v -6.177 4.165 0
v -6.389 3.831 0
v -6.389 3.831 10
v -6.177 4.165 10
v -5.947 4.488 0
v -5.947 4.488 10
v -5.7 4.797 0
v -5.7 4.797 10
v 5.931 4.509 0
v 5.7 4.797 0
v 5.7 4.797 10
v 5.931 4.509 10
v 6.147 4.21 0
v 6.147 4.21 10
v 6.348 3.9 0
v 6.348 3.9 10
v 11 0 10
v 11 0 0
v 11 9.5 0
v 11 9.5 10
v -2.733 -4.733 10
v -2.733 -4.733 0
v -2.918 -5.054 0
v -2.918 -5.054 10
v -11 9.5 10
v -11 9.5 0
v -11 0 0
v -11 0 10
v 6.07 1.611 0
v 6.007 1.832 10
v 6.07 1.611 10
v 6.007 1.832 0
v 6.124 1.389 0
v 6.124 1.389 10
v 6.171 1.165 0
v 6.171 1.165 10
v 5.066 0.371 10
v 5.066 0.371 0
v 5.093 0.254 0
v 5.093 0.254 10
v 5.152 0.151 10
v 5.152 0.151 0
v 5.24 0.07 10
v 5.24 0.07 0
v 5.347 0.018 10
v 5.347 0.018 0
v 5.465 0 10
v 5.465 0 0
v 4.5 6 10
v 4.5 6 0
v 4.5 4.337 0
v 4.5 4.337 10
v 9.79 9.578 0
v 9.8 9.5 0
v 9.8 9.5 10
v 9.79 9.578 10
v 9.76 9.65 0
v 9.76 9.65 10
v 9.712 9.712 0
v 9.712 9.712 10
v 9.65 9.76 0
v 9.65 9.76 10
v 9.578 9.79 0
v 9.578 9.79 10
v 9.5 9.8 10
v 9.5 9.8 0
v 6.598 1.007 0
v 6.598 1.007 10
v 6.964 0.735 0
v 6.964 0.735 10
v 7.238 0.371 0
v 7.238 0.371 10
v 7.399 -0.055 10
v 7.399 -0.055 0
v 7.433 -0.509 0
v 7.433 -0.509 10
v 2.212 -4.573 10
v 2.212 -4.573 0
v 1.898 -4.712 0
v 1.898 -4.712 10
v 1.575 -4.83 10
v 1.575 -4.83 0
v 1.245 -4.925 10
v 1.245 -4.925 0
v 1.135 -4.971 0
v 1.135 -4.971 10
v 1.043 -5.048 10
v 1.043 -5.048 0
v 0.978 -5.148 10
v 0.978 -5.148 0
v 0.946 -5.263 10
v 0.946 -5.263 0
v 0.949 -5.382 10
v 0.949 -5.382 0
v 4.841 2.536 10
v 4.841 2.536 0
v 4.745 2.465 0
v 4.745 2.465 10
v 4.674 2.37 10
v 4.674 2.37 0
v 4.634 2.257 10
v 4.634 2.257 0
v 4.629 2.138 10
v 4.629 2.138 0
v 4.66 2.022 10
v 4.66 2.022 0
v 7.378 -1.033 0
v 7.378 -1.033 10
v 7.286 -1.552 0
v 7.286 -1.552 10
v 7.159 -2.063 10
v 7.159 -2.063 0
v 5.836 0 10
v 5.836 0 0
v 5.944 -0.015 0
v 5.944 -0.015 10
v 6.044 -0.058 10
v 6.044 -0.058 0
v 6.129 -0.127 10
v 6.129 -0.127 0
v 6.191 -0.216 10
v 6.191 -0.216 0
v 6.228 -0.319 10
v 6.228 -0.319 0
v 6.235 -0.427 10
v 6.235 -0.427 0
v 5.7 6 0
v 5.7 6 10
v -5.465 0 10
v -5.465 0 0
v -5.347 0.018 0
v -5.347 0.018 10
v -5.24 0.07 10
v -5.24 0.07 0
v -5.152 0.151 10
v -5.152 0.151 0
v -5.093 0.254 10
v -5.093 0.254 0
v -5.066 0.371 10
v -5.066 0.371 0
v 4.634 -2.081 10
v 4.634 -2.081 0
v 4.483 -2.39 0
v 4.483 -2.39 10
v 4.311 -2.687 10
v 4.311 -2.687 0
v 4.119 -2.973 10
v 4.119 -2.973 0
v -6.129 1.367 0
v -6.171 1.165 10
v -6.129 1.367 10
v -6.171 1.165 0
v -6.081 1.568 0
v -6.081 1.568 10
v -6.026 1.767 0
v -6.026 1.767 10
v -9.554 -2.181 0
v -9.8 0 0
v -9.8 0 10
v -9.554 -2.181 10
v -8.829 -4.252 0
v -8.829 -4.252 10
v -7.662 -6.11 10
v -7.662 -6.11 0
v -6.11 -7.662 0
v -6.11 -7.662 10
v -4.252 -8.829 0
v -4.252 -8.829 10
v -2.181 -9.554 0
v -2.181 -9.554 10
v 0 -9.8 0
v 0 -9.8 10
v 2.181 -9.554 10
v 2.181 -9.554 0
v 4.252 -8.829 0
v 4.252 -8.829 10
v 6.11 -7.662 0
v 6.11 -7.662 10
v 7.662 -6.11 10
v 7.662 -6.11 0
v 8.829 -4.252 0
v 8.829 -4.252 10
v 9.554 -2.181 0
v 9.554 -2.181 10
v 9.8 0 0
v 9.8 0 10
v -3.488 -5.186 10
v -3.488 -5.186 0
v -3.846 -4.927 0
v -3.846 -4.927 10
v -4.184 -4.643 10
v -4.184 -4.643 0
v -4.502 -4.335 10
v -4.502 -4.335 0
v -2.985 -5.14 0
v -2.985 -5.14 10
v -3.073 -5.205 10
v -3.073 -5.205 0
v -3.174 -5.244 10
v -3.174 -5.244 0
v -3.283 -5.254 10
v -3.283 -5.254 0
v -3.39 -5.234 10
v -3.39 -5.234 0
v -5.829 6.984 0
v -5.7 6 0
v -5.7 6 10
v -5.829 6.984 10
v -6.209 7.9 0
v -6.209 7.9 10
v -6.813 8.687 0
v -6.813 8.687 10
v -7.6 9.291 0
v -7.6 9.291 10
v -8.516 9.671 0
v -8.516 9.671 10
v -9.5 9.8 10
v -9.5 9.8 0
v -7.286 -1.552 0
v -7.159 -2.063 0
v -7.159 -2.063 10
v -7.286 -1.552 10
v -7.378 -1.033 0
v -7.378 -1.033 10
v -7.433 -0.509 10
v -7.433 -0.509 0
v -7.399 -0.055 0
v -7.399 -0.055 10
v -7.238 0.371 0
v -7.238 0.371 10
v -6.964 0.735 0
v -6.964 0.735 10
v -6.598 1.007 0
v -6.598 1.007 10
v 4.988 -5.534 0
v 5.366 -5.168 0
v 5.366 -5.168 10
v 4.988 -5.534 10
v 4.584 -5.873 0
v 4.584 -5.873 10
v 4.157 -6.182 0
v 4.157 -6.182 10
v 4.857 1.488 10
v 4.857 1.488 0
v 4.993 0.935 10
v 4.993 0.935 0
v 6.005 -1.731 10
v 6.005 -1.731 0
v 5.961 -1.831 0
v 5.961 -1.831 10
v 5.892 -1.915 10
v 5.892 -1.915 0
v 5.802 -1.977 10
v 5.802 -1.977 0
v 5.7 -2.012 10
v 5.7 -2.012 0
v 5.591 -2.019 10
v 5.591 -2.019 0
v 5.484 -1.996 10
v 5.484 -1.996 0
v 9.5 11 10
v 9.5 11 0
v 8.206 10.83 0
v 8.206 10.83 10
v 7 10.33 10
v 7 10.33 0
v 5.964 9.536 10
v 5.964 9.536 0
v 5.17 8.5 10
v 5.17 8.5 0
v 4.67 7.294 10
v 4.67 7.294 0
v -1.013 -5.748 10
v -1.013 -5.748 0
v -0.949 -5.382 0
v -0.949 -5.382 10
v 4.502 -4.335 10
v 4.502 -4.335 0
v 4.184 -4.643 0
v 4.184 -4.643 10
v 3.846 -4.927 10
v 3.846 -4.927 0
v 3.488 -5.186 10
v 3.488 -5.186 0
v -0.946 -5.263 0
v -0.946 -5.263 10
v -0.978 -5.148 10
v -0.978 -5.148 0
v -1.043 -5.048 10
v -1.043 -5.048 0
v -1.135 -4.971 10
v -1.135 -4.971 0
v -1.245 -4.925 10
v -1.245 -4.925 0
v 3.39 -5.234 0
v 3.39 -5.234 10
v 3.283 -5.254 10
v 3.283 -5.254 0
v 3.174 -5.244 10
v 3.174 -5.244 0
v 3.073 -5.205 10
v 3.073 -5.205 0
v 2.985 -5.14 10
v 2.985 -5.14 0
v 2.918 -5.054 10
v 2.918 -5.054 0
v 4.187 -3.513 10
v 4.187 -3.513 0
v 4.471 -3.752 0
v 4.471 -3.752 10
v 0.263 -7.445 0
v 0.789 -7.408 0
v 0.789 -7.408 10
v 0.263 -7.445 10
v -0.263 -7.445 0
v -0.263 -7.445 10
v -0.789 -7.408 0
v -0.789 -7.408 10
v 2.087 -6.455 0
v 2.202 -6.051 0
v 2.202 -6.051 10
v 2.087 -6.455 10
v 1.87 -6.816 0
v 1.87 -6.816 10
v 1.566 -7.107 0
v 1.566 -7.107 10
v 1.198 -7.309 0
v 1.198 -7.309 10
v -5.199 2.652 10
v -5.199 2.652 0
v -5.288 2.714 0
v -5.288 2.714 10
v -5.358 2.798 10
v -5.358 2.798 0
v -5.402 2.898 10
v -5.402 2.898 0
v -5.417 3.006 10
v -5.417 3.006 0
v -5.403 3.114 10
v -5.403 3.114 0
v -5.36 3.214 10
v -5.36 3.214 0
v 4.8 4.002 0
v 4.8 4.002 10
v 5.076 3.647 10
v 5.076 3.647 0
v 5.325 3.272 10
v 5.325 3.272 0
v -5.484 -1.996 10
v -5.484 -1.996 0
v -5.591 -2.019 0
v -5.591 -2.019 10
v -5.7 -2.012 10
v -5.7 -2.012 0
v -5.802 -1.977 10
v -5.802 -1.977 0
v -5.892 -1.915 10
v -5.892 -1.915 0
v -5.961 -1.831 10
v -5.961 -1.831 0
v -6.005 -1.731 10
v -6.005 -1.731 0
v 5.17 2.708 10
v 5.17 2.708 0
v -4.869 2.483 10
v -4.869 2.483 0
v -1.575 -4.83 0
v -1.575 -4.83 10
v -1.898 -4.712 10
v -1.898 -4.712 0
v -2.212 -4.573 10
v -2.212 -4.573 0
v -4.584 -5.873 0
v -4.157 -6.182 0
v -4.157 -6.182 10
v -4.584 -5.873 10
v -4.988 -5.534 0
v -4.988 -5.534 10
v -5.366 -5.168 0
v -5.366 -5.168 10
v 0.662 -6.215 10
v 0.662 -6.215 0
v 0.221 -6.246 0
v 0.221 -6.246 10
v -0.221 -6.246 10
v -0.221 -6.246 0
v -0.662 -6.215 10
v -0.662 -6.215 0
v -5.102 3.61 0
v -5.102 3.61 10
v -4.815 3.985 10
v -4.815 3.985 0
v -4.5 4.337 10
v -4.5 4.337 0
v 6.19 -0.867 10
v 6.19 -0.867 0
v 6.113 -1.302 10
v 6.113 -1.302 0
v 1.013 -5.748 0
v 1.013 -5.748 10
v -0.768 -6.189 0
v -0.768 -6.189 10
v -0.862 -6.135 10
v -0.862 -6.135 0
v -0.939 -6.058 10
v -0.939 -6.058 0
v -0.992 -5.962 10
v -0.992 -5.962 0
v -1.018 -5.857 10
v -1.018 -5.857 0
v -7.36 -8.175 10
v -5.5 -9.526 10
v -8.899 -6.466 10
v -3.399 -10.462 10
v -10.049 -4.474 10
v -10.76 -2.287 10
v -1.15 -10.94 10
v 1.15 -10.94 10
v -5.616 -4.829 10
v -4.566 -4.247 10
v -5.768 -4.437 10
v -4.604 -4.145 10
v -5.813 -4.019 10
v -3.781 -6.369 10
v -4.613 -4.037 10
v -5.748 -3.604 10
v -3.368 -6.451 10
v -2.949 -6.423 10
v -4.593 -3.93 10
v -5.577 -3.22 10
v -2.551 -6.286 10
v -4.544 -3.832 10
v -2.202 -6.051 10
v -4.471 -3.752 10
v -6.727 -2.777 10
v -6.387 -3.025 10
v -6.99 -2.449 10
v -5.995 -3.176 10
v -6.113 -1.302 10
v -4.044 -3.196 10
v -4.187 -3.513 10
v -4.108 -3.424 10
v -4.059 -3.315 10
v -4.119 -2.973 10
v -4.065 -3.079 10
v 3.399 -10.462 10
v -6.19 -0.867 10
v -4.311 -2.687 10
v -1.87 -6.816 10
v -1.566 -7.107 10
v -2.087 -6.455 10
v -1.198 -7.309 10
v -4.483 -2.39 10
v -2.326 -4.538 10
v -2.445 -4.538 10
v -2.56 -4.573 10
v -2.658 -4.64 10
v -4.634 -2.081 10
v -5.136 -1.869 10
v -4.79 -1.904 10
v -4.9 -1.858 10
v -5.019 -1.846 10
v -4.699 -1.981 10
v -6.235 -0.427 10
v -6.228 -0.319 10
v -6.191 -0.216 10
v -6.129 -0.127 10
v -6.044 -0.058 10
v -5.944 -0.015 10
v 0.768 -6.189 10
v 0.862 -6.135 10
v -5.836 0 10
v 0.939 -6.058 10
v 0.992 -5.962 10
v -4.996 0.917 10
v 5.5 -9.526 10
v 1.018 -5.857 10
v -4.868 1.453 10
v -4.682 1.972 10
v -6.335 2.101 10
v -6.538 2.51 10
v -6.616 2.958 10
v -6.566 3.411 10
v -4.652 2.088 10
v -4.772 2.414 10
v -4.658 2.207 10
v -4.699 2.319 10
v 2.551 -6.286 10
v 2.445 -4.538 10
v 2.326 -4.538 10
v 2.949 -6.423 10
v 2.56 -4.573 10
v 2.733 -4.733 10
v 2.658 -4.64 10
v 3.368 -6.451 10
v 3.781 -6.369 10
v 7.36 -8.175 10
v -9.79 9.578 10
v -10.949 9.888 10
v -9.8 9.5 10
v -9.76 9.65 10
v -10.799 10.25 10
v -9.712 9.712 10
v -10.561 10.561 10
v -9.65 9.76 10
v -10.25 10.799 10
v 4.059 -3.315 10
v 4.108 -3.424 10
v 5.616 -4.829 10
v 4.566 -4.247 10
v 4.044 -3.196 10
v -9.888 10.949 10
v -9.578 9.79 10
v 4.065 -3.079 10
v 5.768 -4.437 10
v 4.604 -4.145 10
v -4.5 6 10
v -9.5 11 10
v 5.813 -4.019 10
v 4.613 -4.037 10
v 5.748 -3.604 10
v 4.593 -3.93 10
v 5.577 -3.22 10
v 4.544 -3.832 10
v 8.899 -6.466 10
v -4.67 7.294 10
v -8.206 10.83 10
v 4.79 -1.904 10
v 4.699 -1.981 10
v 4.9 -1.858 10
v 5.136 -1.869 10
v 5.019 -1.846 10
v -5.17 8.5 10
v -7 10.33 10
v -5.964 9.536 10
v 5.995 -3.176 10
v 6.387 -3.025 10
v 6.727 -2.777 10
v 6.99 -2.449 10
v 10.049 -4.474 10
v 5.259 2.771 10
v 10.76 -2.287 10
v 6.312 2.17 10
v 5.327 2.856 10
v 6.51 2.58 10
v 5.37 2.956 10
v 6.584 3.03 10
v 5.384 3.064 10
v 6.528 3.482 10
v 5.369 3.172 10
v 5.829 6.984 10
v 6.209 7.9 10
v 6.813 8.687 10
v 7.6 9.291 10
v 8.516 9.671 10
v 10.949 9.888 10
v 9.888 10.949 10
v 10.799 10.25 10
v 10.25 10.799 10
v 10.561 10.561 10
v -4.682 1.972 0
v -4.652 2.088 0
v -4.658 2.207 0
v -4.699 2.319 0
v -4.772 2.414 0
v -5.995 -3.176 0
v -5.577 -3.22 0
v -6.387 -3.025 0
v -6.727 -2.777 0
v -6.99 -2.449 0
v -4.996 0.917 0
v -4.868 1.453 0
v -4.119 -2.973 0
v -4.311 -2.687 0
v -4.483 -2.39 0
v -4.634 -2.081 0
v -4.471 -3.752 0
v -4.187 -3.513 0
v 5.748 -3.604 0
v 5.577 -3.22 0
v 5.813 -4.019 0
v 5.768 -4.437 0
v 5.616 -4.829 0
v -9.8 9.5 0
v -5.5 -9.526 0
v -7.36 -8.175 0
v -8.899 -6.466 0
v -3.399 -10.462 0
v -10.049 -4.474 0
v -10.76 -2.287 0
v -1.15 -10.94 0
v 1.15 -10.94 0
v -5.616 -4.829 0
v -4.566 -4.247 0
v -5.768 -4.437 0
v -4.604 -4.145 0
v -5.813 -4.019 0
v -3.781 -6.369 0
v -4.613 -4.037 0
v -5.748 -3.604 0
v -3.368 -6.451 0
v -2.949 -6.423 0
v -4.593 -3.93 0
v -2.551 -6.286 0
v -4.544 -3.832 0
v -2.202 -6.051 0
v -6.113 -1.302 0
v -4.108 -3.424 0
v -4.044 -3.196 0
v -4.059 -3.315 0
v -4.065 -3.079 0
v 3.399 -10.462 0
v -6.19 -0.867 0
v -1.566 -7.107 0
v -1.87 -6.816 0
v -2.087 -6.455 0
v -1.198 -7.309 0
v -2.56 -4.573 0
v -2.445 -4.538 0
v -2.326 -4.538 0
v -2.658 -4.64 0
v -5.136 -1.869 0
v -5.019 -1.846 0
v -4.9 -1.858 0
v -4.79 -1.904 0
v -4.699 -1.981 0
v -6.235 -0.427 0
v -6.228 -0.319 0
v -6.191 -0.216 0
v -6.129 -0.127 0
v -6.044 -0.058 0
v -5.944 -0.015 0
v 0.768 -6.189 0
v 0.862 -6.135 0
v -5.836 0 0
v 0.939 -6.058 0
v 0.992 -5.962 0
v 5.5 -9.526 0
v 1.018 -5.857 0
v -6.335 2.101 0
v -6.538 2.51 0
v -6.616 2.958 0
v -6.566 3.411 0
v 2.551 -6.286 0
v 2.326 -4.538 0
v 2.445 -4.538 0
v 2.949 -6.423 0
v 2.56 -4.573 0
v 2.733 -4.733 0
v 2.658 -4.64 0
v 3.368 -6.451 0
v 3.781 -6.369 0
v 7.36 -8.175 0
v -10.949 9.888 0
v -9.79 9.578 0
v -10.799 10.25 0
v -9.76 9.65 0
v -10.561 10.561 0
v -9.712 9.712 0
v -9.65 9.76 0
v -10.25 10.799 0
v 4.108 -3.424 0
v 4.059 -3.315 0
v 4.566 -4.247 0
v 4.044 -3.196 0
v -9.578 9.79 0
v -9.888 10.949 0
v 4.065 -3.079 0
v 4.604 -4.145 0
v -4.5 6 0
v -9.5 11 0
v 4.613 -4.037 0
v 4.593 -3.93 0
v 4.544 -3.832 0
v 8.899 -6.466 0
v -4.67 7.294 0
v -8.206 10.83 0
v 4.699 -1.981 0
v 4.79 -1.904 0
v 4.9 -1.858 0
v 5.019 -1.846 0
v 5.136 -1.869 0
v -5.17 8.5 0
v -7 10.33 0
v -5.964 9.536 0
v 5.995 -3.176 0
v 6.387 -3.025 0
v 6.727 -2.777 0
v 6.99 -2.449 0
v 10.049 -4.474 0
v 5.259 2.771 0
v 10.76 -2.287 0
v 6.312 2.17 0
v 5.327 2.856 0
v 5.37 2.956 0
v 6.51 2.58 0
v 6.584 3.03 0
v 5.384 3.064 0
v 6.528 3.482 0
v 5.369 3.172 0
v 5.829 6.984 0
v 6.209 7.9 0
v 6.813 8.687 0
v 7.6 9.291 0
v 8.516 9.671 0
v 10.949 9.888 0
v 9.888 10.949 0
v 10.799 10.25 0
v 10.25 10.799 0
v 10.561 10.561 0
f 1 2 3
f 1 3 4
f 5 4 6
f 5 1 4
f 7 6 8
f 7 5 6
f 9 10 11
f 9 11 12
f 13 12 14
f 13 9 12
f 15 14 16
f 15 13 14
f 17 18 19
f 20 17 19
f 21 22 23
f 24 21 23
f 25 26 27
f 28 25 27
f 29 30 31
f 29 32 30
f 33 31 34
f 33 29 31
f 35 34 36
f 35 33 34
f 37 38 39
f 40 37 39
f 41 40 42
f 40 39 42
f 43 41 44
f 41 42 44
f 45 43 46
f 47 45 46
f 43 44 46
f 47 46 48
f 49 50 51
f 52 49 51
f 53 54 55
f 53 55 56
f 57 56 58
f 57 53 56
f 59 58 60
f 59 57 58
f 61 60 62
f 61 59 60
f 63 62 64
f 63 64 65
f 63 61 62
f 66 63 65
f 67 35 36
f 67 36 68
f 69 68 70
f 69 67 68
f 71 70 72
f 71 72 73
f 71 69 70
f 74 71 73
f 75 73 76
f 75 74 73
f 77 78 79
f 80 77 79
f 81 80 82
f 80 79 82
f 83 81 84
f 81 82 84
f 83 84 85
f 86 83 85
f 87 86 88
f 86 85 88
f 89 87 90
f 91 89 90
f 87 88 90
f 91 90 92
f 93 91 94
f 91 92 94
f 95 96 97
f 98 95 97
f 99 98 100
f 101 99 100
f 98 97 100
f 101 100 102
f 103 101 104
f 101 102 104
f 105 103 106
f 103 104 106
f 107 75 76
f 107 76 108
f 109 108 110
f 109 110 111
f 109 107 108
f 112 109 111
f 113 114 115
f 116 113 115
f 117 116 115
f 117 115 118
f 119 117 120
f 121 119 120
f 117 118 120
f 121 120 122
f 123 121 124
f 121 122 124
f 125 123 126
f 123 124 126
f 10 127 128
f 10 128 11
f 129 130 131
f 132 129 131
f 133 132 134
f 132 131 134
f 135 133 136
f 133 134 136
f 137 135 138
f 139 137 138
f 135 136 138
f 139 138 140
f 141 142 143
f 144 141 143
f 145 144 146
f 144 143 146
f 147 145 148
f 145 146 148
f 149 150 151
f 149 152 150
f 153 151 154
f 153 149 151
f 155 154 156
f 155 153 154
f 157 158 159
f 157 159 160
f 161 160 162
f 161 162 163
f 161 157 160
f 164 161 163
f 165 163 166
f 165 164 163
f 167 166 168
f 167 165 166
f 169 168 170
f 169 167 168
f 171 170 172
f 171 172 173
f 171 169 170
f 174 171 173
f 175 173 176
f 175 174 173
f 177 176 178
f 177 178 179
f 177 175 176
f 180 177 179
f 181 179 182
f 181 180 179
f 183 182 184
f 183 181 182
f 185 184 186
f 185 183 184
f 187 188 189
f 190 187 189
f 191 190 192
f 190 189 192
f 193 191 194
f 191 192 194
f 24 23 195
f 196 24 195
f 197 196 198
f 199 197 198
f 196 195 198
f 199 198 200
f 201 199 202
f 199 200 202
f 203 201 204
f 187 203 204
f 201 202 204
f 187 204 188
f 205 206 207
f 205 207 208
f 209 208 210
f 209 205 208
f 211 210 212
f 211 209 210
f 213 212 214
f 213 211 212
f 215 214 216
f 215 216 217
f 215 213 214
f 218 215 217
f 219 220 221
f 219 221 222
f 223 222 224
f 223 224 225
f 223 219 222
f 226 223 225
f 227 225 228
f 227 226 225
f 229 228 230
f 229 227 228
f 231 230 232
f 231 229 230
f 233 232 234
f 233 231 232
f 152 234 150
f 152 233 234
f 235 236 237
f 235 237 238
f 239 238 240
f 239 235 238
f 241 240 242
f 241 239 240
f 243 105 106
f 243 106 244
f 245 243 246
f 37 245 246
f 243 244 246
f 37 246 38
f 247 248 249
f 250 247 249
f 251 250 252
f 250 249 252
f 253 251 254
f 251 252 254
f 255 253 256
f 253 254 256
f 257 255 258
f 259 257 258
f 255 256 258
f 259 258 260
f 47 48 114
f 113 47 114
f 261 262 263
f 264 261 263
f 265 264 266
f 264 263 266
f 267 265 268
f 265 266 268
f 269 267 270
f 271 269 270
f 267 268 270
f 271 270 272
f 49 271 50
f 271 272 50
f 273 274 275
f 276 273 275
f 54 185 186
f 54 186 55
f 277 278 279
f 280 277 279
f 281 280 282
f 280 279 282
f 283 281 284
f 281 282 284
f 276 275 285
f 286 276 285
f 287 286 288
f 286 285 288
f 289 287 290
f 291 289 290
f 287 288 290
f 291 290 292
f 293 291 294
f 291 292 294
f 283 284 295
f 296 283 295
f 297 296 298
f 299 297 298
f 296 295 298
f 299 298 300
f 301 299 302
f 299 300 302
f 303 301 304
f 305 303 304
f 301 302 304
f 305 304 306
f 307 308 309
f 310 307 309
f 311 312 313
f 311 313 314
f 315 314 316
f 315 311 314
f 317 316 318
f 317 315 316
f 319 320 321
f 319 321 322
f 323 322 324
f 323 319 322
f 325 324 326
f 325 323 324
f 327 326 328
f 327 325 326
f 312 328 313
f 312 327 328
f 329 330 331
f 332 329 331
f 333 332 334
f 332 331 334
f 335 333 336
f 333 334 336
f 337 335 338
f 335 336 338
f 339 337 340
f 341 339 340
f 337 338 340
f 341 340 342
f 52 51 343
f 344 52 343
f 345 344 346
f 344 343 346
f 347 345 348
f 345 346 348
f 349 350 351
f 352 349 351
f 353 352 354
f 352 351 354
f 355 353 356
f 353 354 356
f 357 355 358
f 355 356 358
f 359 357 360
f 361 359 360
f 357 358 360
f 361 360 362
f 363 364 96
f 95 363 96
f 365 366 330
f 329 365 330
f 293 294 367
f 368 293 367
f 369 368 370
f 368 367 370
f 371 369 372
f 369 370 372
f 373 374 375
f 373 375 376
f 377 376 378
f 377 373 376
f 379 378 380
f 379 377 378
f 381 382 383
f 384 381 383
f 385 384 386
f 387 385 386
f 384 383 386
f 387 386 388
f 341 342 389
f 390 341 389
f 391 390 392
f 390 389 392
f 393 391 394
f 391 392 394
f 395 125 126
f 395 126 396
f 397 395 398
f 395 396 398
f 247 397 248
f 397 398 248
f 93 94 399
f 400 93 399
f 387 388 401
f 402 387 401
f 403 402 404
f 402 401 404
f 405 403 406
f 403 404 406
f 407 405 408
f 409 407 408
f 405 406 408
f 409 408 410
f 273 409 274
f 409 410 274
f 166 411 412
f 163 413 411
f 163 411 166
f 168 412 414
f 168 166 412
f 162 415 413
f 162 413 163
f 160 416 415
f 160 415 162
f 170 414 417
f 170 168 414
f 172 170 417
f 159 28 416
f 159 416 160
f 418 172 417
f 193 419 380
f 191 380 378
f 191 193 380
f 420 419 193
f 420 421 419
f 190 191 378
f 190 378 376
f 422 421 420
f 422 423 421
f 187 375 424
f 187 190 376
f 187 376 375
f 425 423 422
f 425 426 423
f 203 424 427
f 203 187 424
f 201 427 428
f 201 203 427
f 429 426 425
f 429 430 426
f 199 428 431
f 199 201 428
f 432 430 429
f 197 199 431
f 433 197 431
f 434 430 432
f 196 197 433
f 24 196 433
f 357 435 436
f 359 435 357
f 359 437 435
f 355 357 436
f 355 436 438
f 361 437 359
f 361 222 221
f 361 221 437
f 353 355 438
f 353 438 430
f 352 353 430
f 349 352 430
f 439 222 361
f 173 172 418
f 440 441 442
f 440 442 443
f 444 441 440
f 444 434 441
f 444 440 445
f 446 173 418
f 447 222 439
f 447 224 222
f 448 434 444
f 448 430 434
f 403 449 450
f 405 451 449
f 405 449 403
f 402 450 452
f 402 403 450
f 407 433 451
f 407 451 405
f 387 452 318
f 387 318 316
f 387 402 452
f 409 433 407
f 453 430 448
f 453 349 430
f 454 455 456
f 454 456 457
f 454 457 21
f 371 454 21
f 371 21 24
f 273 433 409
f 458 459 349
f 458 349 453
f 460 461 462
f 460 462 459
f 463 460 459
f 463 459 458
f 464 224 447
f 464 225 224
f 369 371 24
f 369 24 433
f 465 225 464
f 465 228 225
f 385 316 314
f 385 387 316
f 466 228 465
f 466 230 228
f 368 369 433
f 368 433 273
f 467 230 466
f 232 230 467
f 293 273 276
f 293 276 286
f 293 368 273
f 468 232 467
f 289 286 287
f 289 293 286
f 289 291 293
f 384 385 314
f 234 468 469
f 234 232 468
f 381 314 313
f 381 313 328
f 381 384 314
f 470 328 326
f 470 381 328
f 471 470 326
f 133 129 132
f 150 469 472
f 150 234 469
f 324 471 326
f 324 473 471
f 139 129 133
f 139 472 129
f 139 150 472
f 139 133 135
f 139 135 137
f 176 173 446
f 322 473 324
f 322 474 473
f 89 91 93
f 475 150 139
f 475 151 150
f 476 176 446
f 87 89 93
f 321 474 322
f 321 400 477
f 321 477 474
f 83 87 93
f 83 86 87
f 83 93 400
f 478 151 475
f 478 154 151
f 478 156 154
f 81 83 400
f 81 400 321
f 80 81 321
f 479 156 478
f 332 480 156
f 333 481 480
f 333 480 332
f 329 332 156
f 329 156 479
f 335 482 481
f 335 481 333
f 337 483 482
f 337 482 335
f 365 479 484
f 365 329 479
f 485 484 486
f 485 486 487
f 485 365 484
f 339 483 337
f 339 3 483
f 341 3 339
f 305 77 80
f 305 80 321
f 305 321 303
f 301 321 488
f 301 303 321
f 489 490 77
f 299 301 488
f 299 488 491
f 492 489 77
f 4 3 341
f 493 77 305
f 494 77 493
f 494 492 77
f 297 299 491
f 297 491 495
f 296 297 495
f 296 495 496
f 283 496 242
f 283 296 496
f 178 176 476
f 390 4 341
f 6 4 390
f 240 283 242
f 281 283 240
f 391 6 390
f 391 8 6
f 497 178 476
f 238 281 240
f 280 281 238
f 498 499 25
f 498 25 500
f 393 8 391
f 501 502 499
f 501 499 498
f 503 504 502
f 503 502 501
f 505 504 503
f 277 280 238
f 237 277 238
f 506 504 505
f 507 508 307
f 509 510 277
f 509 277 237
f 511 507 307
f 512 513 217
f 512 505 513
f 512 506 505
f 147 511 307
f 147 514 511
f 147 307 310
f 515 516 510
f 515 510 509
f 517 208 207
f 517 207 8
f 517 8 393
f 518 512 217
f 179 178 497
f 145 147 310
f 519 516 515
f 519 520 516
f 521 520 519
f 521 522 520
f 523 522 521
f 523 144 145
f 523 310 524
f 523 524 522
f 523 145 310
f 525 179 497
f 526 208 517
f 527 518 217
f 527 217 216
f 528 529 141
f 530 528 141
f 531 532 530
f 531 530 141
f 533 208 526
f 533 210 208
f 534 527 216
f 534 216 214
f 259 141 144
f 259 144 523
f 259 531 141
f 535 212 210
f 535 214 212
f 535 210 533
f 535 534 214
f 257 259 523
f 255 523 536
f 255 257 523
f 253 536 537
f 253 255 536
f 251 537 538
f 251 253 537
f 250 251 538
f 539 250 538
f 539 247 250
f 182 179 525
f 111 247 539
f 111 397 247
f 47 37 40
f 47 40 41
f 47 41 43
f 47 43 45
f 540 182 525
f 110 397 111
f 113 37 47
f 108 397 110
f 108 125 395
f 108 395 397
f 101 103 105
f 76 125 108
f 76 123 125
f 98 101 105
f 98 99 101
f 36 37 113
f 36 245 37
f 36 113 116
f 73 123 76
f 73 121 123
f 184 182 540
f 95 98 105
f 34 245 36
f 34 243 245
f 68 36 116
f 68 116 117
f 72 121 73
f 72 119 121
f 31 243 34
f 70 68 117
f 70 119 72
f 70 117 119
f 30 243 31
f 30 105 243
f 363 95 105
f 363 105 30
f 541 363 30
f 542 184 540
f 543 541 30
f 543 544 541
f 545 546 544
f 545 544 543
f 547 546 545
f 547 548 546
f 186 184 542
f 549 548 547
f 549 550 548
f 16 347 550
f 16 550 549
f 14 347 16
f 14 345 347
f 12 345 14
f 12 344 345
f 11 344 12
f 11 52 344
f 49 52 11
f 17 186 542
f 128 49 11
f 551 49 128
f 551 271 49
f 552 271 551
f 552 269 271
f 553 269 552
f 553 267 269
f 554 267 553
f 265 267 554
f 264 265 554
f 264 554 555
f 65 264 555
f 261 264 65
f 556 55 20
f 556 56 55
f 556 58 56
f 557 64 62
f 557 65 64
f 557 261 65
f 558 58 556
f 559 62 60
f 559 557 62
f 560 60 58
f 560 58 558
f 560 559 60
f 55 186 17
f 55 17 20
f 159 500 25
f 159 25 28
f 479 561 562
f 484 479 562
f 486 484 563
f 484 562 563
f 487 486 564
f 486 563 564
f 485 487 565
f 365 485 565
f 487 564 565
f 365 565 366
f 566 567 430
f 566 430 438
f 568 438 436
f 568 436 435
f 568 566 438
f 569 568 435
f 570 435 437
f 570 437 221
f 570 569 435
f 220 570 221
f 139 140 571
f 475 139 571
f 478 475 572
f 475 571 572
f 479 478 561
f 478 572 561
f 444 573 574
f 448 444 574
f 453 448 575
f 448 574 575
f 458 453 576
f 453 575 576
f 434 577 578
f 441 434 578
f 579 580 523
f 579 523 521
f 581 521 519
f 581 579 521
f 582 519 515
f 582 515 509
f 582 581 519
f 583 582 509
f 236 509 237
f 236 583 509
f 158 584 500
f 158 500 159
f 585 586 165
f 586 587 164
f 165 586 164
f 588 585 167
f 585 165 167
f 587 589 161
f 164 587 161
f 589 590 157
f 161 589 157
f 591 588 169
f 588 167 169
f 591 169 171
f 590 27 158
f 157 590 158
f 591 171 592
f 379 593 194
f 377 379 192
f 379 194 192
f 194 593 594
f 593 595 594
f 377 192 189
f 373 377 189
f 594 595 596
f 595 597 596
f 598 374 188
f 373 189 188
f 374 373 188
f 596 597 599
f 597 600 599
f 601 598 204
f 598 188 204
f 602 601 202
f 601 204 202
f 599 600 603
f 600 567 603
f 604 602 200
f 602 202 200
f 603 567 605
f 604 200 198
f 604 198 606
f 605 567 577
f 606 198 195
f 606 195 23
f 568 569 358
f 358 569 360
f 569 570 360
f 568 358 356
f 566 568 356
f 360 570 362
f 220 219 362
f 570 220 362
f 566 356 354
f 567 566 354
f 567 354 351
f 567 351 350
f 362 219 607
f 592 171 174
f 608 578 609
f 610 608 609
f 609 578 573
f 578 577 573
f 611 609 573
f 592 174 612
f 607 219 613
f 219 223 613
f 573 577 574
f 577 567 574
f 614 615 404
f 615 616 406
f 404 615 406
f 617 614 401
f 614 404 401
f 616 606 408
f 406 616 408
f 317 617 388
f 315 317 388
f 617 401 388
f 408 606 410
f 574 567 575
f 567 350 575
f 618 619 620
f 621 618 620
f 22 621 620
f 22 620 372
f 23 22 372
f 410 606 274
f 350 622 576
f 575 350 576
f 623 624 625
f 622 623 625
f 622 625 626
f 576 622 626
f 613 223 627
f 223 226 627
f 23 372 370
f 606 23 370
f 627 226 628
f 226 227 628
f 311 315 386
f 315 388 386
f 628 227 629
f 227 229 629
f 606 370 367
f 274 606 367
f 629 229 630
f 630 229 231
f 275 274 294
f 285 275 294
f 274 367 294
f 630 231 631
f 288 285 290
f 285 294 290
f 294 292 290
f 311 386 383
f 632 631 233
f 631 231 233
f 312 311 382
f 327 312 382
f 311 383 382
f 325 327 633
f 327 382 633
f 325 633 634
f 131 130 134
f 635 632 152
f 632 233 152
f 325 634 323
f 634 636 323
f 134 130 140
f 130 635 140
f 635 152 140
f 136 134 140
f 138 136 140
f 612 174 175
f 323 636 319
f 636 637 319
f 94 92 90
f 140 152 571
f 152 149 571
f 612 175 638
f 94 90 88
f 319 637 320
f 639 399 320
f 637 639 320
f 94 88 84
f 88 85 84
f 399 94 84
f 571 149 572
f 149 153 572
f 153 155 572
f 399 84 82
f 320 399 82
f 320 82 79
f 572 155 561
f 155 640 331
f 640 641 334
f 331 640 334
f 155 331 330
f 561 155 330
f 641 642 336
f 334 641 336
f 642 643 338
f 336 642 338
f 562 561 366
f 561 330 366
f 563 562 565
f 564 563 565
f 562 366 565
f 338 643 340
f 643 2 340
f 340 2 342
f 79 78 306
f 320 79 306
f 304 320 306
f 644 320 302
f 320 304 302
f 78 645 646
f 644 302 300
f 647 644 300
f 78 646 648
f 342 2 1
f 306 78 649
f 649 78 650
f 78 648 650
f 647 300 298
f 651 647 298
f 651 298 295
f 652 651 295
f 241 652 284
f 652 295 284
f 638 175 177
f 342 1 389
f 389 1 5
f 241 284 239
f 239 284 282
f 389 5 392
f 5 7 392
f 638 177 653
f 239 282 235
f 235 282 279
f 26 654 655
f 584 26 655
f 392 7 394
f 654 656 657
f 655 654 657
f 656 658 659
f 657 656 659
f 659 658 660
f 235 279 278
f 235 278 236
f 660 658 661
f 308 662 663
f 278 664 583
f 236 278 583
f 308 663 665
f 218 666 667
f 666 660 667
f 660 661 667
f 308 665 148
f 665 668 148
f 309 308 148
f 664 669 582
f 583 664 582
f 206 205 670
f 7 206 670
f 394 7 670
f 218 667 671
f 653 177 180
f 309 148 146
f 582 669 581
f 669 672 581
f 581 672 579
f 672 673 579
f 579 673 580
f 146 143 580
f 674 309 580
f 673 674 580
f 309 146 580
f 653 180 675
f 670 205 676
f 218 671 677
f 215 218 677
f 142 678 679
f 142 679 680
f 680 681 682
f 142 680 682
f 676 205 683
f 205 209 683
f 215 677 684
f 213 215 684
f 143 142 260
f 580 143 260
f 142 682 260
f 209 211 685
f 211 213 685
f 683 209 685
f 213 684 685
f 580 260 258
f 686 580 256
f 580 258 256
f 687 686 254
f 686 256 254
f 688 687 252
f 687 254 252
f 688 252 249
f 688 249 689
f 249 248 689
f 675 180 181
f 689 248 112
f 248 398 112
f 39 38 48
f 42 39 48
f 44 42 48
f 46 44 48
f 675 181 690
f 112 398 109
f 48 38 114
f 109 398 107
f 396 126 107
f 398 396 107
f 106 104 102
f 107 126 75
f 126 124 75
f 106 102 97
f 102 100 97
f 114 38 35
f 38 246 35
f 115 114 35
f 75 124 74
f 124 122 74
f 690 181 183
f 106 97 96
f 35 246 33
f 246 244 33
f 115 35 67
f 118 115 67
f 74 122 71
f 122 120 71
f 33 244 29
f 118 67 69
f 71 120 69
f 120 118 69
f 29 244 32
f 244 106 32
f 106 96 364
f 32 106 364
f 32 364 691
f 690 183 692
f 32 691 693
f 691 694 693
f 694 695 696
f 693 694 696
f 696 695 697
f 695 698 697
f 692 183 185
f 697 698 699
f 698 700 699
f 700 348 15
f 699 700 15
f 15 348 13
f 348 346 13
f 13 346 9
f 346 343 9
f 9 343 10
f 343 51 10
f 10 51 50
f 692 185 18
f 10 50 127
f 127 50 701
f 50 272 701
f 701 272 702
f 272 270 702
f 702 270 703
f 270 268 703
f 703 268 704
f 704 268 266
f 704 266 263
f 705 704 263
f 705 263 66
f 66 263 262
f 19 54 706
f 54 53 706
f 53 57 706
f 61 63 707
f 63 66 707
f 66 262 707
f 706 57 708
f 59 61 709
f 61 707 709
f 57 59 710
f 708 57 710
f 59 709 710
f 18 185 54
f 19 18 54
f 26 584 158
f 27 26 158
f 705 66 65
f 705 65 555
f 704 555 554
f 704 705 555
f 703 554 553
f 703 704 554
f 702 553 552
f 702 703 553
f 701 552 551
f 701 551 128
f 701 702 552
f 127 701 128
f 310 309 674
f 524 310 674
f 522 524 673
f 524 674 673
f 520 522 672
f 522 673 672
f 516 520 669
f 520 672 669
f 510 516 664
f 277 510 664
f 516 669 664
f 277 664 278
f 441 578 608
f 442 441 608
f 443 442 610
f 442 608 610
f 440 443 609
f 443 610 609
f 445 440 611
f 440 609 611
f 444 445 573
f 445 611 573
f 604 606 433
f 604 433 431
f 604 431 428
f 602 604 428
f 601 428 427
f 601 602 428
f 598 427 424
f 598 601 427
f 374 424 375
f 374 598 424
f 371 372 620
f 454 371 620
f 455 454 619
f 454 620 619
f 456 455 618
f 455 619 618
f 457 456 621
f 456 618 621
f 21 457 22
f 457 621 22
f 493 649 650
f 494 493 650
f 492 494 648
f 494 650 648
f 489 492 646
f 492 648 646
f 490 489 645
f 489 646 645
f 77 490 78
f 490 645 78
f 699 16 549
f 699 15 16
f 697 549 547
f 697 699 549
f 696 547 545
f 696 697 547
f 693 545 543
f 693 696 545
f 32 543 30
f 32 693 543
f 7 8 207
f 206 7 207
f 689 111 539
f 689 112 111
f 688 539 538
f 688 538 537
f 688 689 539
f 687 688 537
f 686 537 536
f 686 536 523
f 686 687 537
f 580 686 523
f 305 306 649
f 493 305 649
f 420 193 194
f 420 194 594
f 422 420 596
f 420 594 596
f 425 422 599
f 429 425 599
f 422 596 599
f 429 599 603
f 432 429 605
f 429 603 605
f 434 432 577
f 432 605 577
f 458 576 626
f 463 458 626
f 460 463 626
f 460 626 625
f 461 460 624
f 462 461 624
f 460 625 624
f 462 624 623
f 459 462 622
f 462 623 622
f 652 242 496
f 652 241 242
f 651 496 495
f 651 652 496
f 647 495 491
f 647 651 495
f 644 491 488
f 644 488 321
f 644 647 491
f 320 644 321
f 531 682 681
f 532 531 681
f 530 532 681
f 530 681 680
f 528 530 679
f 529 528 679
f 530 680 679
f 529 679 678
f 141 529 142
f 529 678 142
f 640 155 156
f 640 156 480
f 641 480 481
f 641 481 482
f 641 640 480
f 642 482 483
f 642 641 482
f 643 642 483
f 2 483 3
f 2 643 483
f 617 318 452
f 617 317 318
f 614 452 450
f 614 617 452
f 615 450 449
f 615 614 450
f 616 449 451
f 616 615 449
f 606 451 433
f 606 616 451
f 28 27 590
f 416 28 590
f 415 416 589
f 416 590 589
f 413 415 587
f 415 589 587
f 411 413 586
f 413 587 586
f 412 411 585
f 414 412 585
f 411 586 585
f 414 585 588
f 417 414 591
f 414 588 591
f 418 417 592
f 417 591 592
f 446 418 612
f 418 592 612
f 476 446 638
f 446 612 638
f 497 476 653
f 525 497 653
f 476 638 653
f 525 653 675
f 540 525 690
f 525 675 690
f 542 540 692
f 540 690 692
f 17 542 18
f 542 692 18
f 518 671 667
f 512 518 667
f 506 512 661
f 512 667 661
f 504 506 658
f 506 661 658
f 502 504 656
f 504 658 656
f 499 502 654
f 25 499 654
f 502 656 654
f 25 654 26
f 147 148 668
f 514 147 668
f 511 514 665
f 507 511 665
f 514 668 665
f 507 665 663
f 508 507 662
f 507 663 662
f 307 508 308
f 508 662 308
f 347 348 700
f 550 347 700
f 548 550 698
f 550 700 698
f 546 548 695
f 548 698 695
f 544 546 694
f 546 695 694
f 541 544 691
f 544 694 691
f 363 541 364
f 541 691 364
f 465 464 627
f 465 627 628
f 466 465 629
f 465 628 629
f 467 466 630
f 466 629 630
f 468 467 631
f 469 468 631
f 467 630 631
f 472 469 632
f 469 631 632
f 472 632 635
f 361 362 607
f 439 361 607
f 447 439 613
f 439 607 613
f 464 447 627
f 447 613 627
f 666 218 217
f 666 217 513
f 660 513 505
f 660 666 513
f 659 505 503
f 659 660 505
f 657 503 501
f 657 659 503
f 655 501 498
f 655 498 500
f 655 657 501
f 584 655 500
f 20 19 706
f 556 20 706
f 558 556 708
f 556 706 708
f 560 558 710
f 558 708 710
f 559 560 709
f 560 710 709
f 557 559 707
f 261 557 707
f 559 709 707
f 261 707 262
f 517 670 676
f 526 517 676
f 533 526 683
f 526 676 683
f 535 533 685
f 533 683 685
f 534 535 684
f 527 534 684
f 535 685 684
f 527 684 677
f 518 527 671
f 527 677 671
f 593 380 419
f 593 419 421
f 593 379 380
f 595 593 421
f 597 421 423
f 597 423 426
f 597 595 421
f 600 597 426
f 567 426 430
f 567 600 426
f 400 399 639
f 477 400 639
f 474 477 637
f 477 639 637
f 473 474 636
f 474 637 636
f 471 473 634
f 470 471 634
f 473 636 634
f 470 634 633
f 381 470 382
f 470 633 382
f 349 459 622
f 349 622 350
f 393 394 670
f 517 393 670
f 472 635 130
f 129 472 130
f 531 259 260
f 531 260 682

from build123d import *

# Parameters (mm, degrees)
F1_DEPTH = 10
F2_T     = -1.2


with BuildPart() as f1:
    # F0 (on Top) → F1 (new body)
    with BuildSketch(Plane.XY):
        with BuildLine():
            ThreePointArc((-5.066449, 0.370803), (-4.939368, 1.187032), (-4.681679, 1.971873))
            ThreePointArc((-4.681679, 1.971873), (-4.674597, 2.264385), (-4.868556, 2.483458))
            Line((-4.868556, 2.483458), (-5.198977, 2.652007))
            ThreePointArc((-5.198977, 2.652007), (-5.401697, 2.897981), (-5.360275, 3.214024))
            ThreePointArc((-5.360275, 3.214024), (-4.962027, 3.800103), (-4.5, 4.337338))
            Line((-4.5, 4.337338), (-4.5, 6))
            ThreePointArc((-4.5, 6), (-5.964466, 9.535534), (-9.5, 11))
            ThreePointArc((-9.5, 11), (-10.56066, 10.56066), (-11, 9.5))
            Line((-11, 9.5), (-11, 0))
            ThreePointArc((-11, 0), (0, -11), (11, 0))
            Line((11, 0), (11, 9.5))
            ThreePointArc((11, 9.5), (10.56066, 10.56066), (9.5, 11))
            ThreePointArc((9.5, 11), (5.964466, 9.535534), (4.5, 6))
            Line((4.5, 6), (4.5, 4.337338))
            ThreePointArc((4.5, 4.337338), (4.941382, 3.82691), (5.325163, 3.271872))
            ThreePointArc((5.325163, 3.271872), (5.370003, 2.956296), (5.169959, 2.708141))
            Line((5.169959, 2.708141), (4.841382, 2.536025))
            ThreePointArc((4.841382, 2.536025), (4.649807, 2.314864), (4.660055, 2.022447))
            ThreePointArc((4.660055, 2.022447), (4.932869, 1.213755), (5.066449, 0.370803))
            ThreePointArc((5.066449, 0.370803), (5.193058, 0.107016), (5.465382, 0))
            Line((5.465382, 0), (5.836309, 0))
            ThreePointArc((5.836309, 0), (6.128661, -0.126998), (6.235373, -0.42735))
            ThreePointArc((6.235373, -0.42735), (6.155048, -1.085301), (6.005496, -1.731045))
            ThreePointArc((6.005496, -1.731045), (5.802494, -1.976786), (5.484336, -1.996135))
            Line((5.484336, -1.996135), (5.135779, -1.869271))
            ThreePointArc((5.135779, -1.869271), (4.843276, -1.876693), (4.634083, -2.081268))
            ThreePointArc((4.634083, -2.081268), (4.399409, -2.54), (4.119473, -2.972599))
            ThreePointArc((4.119473, -2.972599), (4.046902, -3.256054), (4.186725, -3.51308))
            Line((4.186725, -3.51308), (4.470872, -3.751507))
            ThreePointArc((4.470872, -3.751507), (4.613194, -4.036714), (4.501877, -4.33539))
            ThreePointArc((4.501877, -4.33539), (4.017423, -4.787778), (3.487783, -5.186316))
            ThreePointArc((3.487783, -5.186316), (3.174314, -5.244077), (2.918154, -5.054392))
            Line((2.918154, -5.054392), (2.732691, -4.73316))
            ThreePointArc((2.732691, -4.73316), (2.50385, -4.550828), (2.2121, -4.573075))
            ThreePointArc((2.2121, -4.573075), (1.737462, -4.773639), (1.244949, -4.925089))
            ThreePointArc((1.244949, -4.925089), (1.007156, -5.09558), (0.949054, -5.382351))
            Line((0.949054, -5.382351), (1.013464, -5.747642))
            ThreePointArc((1.013464, -5.747642), (0.939162, -6.057606), (0.661903, -6.214852))
            ThreePointArc((0.661903, -6.214852), (0, -6.25), (-0.661903, -6.214852))
            ThreePointArc((-0.661903, -6.214852), (-0.939162, -6.057606), (-1.013464, -5.747642))
            Line((-1.013464, -5.747642), (-0.949054, -5.382351))
            ThreePointArc((-0.949054, -5.382351), (-1.007156, -5.09558), (-1.244949, -4.925089))
            ThreePointArc((-1.244949, -4.925089), (-1.737462, -4.773639), (-2.2121, -4.573075))
            ThreePointArc((-2.2121, -4.573075), (-2.50385, -4.550828), (-2.732691, -4.73316))
            Line((-2.732691, -4.73316), (-2.918154, -5.054392))
            ThreePointArc((-2.918154, -5.054392), (-3.174314, -5.244077), (-3.487783, -5.186316))
            ThreePointArc((-3.487783, -5.186316), (-4.017423, -4.787778), (-4.501877, -4.33539))
            ThreePointArc((-4.501877, -4.33539), (-4.613194, -4.036714), (-4.470872, -3.751507))
            Line((-4.470872, -3.751507), (-4.186725, -3.51308))
            ThreePointArc((-4.186725, -3.51308), (-4.046902, -3.256054), (-4.119473, -2.972599))
            ThreePointArc((-4.119473, -2.972599), (-4.399409, -2.54), (-4.634083, -2.081268))
            ThreePointArc((-4.634083, -2.081268), (-4.843276, -1.876693), (-5.135779, -1.869271))
            Line((-5.135779, -1.869271), (-5.484336, -1.996135))
            ThreePointArc((-5.484336, -1.996135), (-5.802494, -1.976786), (-6.005496, -1.731045))
            ThreePointArc((-6.005496, -1.731045), (-6.155048, -1.085301), (-6.235373, -0.42735))
            ThreePointArc((-6.235373, -0.42735), (-6.128661, -0.126998), (-5.836309, 0))
            Line((-5.836309, 0), (-5.465382, 0))
            ThreePointArc((-5.465382, 0), (-5.193058, 0.107016), (-5.066449, 0.370803))
        make_face()
    extrude(amount=F1_DEPTH)

    # F2
    f2_openings = [f1.faces().sort_by_distance(p)[0] for p in [
        (-1.187768, -6.244675, 10),
        (-1.187768, -6.244675, 0),
    ]]
    offset(amount=F2_T, openings=f2_openings)


solid = f1.part
